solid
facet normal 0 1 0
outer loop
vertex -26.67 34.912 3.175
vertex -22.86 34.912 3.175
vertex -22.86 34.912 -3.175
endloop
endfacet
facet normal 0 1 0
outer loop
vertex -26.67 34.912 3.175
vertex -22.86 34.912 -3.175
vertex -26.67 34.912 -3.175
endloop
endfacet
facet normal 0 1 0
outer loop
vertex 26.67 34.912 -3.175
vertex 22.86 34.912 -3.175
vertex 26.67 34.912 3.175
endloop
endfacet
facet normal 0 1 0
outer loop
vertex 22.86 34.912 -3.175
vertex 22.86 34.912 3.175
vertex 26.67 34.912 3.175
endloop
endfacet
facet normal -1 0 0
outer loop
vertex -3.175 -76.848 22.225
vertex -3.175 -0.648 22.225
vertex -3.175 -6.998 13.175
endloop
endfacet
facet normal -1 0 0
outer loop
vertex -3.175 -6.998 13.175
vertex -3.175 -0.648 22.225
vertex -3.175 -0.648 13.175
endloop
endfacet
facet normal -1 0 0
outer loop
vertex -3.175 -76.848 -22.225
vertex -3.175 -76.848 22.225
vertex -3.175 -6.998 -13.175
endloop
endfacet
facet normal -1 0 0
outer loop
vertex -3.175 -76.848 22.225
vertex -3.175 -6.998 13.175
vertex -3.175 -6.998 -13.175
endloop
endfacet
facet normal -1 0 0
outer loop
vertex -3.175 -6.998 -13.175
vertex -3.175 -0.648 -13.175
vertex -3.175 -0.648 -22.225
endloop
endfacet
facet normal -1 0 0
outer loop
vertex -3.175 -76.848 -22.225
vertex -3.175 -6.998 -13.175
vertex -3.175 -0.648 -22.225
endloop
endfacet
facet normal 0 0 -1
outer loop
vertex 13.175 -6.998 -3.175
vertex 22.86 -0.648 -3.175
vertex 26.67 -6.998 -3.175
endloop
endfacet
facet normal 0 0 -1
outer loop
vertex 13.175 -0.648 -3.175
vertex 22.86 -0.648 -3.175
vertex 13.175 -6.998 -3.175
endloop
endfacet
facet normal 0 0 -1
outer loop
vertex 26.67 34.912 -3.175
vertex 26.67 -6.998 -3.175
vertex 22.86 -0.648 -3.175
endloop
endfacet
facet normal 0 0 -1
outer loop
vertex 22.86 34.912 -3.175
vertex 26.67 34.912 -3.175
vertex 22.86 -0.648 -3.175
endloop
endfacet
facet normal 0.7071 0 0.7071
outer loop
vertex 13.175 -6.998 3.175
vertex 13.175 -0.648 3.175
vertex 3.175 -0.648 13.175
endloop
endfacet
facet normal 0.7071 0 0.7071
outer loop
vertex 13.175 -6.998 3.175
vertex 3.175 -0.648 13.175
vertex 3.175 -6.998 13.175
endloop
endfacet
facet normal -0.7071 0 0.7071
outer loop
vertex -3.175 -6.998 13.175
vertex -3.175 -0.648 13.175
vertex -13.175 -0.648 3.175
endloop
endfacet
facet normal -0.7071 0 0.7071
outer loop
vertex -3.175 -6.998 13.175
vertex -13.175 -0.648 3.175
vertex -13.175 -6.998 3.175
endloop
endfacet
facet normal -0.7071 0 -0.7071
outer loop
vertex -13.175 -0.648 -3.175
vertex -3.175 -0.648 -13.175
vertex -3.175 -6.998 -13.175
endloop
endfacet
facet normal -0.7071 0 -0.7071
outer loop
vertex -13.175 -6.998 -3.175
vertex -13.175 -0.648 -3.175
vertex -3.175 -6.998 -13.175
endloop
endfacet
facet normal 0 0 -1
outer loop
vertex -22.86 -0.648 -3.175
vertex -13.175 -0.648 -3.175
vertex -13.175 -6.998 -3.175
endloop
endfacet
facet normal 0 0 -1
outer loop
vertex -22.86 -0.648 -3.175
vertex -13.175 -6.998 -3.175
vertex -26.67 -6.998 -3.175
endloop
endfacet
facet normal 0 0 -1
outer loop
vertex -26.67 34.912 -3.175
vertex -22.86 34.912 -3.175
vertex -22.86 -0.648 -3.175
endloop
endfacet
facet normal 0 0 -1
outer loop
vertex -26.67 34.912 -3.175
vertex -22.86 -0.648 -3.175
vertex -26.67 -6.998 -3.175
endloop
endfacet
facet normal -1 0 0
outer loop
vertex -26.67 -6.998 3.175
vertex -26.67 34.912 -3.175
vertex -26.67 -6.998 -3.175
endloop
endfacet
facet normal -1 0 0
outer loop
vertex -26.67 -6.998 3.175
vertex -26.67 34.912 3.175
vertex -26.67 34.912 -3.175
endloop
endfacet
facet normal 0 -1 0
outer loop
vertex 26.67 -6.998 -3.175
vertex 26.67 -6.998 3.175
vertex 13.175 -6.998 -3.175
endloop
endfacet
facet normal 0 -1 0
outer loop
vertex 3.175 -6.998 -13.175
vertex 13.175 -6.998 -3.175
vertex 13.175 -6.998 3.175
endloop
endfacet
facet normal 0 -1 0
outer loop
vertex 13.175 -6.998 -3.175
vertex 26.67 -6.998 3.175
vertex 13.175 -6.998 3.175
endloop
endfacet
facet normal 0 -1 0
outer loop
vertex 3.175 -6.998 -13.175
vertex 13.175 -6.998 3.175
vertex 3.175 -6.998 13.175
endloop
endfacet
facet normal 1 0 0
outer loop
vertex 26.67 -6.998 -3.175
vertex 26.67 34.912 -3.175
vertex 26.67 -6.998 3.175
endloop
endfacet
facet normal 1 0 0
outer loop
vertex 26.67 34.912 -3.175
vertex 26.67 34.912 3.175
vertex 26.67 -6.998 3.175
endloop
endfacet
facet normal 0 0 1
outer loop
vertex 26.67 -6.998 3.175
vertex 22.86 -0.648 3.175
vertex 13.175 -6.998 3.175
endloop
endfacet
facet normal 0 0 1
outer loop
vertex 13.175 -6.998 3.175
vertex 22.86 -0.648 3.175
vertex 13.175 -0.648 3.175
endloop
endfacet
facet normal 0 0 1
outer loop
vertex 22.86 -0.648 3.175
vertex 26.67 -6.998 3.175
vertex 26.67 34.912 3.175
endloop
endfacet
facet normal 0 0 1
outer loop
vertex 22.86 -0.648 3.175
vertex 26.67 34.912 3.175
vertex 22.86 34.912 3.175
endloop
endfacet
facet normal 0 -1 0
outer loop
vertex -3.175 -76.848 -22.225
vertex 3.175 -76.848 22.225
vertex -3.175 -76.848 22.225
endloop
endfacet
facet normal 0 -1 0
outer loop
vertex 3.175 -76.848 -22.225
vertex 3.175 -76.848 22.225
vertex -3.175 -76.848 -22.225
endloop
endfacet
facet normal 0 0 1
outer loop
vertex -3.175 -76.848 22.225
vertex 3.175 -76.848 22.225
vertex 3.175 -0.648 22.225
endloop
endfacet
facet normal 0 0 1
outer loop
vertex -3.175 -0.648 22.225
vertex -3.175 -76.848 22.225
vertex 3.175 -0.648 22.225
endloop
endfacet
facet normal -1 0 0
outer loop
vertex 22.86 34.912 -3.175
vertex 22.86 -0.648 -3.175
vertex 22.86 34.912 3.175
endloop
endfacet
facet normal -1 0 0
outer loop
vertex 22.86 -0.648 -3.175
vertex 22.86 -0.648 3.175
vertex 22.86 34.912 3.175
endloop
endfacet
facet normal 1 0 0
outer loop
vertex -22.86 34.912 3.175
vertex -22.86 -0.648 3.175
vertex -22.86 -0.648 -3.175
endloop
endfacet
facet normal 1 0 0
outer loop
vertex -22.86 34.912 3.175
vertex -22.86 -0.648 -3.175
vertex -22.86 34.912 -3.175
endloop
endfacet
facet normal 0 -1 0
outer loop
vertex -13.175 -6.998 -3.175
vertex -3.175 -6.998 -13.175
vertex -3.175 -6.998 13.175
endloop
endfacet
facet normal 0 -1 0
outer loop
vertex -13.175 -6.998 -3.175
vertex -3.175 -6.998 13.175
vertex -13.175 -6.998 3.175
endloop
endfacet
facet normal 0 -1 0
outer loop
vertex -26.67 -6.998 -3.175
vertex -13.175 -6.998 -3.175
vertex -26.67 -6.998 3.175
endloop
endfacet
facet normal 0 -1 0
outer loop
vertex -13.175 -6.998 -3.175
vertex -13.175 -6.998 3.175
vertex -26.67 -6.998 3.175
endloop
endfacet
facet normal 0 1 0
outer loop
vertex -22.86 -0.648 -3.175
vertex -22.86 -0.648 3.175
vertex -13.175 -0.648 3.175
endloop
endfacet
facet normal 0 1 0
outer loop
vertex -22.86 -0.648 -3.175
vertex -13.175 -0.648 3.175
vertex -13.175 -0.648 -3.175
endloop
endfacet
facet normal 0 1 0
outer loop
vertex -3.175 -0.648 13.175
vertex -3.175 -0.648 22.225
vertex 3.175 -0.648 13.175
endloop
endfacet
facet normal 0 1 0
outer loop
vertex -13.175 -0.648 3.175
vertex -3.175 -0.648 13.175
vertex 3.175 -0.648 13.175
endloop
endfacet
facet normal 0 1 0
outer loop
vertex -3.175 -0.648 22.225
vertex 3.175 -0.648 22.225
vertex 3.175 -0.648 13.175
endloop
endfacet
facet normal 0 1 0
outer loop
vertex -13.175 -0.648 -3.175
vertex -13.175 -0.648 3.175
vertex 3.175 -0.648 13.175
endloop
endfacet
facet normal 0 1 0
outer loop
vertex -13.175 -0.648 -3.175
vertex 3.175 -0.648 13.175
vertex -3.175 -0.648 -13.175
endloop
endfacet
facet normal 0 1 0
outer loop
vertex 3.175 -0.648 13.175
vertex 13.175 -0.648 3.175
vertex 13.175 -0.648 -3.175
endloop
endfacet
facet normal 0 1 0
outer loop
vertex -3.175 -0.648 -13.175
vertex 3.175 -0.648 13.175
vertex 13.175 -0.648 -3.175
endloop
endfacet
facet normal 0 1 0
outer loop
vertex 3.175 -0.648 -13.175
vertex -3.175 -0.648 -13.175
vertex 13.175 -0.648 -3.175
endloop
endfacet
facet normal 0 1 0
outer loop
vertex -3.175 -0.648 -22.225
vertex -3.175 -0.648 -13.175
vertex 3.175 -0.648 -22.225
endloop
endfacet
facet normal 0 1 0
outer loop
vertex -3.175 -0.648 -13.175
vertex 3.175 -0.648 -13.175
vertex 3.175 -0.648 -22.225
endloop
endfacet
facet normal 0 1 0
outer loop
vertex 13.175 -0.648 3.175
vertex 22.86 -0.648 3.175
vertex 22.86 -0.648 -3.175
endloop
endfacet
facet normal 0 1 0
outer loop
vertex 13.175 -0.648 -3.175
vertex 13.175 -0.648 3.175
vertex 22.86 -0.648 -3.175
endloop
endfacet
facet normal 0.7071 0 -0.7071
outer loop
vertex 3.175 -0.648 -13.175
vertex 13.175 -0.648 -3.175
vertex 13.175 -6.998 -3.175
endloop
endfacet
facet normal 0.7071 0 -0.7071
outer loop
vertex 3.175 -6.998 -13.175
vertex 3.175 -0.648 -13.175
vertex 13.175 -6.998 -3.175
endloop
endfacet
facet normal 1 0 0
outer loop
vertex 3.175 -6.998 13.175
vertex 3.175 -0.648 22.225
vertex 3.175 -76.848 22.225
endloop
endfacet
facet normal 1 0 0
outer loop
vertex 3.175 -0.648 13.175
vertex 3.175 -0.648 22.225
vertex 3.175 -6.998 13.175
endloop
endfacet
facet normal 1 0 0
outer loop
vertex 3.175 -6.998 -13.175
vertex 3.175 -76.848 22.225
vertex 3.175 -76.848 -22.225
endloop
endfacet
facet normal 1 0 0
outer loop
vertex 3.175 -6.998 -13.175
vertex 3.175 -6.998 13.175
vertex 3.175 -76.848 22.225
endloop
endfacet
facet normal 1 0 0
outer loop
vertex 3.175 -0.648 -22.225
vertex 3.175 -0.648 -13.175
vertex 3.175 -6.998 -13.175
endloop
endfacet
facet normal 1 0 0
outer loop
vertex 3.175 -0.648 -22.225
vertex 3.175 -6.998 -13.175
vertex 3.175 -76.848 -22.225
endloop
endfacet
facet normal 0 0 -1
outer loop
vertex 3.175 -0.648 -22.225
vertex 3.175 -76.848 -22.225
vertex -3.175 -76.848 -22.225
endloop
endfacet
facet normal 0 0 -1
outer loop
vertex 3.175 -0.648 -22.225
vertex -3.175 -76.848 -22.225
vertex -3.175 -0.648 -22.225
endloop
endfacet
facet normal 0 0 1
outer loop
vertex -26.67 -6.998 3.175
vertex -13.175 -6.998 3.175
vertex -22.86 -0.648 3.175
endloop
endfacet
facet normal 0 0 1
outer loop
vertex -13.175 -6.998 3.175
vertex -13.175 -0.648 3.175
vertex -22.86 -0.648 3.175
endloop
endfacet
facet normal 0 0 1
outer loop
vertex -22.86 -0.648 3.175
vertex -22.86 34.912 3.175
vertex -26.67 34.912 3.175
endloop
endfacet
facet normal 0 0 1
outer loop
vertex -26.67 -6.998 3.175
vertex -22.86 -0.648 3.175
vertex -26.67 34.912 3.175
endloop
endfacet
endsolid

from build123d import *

# Parameters (mm, degrees)
BOSS_EXTRUDE1_DEPTH  = 3.175
MIRROR2_COPY_1_DEPTH = 3.175
SKETCH2_W            = 44.45
SKETCH2_H            = 76.2
BOSS_EXTRUDE2_DEPTH  = 3.175
CHAMFER1_SIZE        = 10


with BuildPart() as part:
    # Sketch1 → Boss-Extrude1 (new body)
    with BuildSketch(Plane.XY):
        Polygon((0, -6.997959184), (0, -0.647959184), (-22.86, -0.647959184), (-22.86, 34.912040816), (-26.67, 34.912040816), (-26.67, -6.997959184), align=None)
    boss_extrude1 = extrude(amount=BOSS_EXTRUDE1_DEPTH)

    # Mirror1: Boss-Extrude1 across plane
    add(boss_extrude1.mirror(Plane.XY))

    # Mirror2: Boss-Extrude1 across plane
    add(boss_extrude1.mirror(Plane(origin=(0, 0, 0), x_dir=(0, 0, 1), z_dir=(1, 0, 0))))

    # Mirror2 copy 1 sketch → Mirror2 copy 1 (add)
    with BuildSketch(Plane(origin=(0, 0, 0), x_dir=(-1, 0, 0), z_dir=(0, 0, -1))):
        Polygon((0, -6.997959184), (0, -0.647959184), (-22.86, -0.647959184), (-22.86, 34.912040816), (-26.67, 34.912040816), (-26.67, -6.997959184), align=None)
    extrude(amount=MIRROR2_COPY_1_DEPTH)

    # Sketch2 → Boss-Extrude2 (add)
    with BuildSketch(Plane(origin=(0, 0, 0), x_dir=(0, 0, -1), z_dir=(1, 0, 0))):
        with Locations((0, -38.747959184)):
            Rectangle(SKETCH2_W, SKETCH2_H)
    boss_extrude2 = extrude(amount=BOSS_EXTRUDE2_DEPTH)

    # Mirror3: Boss-Extrude2 across plane
    add(boss_extrude2.mirror(Plane(origin=(0, 0, 0), x_dir=(0, 0, 1), z_dir=(1, 0, 0))))

    # Chamfer1
    chamfer1_edges = [part.edges().sort_by_distance(p)[0] for p in [
        (3.175, -3.822959184, -3.175),
        (3.175, -3.822959184, 3.175),
        (-3.175, -3.822959184, -3.175),
        (-3.175, -3.822959184, 3.175),
    ]]
    chamfer(chamfer1_edges, length=CHAMFER1_SIZE)


solid = part.part
